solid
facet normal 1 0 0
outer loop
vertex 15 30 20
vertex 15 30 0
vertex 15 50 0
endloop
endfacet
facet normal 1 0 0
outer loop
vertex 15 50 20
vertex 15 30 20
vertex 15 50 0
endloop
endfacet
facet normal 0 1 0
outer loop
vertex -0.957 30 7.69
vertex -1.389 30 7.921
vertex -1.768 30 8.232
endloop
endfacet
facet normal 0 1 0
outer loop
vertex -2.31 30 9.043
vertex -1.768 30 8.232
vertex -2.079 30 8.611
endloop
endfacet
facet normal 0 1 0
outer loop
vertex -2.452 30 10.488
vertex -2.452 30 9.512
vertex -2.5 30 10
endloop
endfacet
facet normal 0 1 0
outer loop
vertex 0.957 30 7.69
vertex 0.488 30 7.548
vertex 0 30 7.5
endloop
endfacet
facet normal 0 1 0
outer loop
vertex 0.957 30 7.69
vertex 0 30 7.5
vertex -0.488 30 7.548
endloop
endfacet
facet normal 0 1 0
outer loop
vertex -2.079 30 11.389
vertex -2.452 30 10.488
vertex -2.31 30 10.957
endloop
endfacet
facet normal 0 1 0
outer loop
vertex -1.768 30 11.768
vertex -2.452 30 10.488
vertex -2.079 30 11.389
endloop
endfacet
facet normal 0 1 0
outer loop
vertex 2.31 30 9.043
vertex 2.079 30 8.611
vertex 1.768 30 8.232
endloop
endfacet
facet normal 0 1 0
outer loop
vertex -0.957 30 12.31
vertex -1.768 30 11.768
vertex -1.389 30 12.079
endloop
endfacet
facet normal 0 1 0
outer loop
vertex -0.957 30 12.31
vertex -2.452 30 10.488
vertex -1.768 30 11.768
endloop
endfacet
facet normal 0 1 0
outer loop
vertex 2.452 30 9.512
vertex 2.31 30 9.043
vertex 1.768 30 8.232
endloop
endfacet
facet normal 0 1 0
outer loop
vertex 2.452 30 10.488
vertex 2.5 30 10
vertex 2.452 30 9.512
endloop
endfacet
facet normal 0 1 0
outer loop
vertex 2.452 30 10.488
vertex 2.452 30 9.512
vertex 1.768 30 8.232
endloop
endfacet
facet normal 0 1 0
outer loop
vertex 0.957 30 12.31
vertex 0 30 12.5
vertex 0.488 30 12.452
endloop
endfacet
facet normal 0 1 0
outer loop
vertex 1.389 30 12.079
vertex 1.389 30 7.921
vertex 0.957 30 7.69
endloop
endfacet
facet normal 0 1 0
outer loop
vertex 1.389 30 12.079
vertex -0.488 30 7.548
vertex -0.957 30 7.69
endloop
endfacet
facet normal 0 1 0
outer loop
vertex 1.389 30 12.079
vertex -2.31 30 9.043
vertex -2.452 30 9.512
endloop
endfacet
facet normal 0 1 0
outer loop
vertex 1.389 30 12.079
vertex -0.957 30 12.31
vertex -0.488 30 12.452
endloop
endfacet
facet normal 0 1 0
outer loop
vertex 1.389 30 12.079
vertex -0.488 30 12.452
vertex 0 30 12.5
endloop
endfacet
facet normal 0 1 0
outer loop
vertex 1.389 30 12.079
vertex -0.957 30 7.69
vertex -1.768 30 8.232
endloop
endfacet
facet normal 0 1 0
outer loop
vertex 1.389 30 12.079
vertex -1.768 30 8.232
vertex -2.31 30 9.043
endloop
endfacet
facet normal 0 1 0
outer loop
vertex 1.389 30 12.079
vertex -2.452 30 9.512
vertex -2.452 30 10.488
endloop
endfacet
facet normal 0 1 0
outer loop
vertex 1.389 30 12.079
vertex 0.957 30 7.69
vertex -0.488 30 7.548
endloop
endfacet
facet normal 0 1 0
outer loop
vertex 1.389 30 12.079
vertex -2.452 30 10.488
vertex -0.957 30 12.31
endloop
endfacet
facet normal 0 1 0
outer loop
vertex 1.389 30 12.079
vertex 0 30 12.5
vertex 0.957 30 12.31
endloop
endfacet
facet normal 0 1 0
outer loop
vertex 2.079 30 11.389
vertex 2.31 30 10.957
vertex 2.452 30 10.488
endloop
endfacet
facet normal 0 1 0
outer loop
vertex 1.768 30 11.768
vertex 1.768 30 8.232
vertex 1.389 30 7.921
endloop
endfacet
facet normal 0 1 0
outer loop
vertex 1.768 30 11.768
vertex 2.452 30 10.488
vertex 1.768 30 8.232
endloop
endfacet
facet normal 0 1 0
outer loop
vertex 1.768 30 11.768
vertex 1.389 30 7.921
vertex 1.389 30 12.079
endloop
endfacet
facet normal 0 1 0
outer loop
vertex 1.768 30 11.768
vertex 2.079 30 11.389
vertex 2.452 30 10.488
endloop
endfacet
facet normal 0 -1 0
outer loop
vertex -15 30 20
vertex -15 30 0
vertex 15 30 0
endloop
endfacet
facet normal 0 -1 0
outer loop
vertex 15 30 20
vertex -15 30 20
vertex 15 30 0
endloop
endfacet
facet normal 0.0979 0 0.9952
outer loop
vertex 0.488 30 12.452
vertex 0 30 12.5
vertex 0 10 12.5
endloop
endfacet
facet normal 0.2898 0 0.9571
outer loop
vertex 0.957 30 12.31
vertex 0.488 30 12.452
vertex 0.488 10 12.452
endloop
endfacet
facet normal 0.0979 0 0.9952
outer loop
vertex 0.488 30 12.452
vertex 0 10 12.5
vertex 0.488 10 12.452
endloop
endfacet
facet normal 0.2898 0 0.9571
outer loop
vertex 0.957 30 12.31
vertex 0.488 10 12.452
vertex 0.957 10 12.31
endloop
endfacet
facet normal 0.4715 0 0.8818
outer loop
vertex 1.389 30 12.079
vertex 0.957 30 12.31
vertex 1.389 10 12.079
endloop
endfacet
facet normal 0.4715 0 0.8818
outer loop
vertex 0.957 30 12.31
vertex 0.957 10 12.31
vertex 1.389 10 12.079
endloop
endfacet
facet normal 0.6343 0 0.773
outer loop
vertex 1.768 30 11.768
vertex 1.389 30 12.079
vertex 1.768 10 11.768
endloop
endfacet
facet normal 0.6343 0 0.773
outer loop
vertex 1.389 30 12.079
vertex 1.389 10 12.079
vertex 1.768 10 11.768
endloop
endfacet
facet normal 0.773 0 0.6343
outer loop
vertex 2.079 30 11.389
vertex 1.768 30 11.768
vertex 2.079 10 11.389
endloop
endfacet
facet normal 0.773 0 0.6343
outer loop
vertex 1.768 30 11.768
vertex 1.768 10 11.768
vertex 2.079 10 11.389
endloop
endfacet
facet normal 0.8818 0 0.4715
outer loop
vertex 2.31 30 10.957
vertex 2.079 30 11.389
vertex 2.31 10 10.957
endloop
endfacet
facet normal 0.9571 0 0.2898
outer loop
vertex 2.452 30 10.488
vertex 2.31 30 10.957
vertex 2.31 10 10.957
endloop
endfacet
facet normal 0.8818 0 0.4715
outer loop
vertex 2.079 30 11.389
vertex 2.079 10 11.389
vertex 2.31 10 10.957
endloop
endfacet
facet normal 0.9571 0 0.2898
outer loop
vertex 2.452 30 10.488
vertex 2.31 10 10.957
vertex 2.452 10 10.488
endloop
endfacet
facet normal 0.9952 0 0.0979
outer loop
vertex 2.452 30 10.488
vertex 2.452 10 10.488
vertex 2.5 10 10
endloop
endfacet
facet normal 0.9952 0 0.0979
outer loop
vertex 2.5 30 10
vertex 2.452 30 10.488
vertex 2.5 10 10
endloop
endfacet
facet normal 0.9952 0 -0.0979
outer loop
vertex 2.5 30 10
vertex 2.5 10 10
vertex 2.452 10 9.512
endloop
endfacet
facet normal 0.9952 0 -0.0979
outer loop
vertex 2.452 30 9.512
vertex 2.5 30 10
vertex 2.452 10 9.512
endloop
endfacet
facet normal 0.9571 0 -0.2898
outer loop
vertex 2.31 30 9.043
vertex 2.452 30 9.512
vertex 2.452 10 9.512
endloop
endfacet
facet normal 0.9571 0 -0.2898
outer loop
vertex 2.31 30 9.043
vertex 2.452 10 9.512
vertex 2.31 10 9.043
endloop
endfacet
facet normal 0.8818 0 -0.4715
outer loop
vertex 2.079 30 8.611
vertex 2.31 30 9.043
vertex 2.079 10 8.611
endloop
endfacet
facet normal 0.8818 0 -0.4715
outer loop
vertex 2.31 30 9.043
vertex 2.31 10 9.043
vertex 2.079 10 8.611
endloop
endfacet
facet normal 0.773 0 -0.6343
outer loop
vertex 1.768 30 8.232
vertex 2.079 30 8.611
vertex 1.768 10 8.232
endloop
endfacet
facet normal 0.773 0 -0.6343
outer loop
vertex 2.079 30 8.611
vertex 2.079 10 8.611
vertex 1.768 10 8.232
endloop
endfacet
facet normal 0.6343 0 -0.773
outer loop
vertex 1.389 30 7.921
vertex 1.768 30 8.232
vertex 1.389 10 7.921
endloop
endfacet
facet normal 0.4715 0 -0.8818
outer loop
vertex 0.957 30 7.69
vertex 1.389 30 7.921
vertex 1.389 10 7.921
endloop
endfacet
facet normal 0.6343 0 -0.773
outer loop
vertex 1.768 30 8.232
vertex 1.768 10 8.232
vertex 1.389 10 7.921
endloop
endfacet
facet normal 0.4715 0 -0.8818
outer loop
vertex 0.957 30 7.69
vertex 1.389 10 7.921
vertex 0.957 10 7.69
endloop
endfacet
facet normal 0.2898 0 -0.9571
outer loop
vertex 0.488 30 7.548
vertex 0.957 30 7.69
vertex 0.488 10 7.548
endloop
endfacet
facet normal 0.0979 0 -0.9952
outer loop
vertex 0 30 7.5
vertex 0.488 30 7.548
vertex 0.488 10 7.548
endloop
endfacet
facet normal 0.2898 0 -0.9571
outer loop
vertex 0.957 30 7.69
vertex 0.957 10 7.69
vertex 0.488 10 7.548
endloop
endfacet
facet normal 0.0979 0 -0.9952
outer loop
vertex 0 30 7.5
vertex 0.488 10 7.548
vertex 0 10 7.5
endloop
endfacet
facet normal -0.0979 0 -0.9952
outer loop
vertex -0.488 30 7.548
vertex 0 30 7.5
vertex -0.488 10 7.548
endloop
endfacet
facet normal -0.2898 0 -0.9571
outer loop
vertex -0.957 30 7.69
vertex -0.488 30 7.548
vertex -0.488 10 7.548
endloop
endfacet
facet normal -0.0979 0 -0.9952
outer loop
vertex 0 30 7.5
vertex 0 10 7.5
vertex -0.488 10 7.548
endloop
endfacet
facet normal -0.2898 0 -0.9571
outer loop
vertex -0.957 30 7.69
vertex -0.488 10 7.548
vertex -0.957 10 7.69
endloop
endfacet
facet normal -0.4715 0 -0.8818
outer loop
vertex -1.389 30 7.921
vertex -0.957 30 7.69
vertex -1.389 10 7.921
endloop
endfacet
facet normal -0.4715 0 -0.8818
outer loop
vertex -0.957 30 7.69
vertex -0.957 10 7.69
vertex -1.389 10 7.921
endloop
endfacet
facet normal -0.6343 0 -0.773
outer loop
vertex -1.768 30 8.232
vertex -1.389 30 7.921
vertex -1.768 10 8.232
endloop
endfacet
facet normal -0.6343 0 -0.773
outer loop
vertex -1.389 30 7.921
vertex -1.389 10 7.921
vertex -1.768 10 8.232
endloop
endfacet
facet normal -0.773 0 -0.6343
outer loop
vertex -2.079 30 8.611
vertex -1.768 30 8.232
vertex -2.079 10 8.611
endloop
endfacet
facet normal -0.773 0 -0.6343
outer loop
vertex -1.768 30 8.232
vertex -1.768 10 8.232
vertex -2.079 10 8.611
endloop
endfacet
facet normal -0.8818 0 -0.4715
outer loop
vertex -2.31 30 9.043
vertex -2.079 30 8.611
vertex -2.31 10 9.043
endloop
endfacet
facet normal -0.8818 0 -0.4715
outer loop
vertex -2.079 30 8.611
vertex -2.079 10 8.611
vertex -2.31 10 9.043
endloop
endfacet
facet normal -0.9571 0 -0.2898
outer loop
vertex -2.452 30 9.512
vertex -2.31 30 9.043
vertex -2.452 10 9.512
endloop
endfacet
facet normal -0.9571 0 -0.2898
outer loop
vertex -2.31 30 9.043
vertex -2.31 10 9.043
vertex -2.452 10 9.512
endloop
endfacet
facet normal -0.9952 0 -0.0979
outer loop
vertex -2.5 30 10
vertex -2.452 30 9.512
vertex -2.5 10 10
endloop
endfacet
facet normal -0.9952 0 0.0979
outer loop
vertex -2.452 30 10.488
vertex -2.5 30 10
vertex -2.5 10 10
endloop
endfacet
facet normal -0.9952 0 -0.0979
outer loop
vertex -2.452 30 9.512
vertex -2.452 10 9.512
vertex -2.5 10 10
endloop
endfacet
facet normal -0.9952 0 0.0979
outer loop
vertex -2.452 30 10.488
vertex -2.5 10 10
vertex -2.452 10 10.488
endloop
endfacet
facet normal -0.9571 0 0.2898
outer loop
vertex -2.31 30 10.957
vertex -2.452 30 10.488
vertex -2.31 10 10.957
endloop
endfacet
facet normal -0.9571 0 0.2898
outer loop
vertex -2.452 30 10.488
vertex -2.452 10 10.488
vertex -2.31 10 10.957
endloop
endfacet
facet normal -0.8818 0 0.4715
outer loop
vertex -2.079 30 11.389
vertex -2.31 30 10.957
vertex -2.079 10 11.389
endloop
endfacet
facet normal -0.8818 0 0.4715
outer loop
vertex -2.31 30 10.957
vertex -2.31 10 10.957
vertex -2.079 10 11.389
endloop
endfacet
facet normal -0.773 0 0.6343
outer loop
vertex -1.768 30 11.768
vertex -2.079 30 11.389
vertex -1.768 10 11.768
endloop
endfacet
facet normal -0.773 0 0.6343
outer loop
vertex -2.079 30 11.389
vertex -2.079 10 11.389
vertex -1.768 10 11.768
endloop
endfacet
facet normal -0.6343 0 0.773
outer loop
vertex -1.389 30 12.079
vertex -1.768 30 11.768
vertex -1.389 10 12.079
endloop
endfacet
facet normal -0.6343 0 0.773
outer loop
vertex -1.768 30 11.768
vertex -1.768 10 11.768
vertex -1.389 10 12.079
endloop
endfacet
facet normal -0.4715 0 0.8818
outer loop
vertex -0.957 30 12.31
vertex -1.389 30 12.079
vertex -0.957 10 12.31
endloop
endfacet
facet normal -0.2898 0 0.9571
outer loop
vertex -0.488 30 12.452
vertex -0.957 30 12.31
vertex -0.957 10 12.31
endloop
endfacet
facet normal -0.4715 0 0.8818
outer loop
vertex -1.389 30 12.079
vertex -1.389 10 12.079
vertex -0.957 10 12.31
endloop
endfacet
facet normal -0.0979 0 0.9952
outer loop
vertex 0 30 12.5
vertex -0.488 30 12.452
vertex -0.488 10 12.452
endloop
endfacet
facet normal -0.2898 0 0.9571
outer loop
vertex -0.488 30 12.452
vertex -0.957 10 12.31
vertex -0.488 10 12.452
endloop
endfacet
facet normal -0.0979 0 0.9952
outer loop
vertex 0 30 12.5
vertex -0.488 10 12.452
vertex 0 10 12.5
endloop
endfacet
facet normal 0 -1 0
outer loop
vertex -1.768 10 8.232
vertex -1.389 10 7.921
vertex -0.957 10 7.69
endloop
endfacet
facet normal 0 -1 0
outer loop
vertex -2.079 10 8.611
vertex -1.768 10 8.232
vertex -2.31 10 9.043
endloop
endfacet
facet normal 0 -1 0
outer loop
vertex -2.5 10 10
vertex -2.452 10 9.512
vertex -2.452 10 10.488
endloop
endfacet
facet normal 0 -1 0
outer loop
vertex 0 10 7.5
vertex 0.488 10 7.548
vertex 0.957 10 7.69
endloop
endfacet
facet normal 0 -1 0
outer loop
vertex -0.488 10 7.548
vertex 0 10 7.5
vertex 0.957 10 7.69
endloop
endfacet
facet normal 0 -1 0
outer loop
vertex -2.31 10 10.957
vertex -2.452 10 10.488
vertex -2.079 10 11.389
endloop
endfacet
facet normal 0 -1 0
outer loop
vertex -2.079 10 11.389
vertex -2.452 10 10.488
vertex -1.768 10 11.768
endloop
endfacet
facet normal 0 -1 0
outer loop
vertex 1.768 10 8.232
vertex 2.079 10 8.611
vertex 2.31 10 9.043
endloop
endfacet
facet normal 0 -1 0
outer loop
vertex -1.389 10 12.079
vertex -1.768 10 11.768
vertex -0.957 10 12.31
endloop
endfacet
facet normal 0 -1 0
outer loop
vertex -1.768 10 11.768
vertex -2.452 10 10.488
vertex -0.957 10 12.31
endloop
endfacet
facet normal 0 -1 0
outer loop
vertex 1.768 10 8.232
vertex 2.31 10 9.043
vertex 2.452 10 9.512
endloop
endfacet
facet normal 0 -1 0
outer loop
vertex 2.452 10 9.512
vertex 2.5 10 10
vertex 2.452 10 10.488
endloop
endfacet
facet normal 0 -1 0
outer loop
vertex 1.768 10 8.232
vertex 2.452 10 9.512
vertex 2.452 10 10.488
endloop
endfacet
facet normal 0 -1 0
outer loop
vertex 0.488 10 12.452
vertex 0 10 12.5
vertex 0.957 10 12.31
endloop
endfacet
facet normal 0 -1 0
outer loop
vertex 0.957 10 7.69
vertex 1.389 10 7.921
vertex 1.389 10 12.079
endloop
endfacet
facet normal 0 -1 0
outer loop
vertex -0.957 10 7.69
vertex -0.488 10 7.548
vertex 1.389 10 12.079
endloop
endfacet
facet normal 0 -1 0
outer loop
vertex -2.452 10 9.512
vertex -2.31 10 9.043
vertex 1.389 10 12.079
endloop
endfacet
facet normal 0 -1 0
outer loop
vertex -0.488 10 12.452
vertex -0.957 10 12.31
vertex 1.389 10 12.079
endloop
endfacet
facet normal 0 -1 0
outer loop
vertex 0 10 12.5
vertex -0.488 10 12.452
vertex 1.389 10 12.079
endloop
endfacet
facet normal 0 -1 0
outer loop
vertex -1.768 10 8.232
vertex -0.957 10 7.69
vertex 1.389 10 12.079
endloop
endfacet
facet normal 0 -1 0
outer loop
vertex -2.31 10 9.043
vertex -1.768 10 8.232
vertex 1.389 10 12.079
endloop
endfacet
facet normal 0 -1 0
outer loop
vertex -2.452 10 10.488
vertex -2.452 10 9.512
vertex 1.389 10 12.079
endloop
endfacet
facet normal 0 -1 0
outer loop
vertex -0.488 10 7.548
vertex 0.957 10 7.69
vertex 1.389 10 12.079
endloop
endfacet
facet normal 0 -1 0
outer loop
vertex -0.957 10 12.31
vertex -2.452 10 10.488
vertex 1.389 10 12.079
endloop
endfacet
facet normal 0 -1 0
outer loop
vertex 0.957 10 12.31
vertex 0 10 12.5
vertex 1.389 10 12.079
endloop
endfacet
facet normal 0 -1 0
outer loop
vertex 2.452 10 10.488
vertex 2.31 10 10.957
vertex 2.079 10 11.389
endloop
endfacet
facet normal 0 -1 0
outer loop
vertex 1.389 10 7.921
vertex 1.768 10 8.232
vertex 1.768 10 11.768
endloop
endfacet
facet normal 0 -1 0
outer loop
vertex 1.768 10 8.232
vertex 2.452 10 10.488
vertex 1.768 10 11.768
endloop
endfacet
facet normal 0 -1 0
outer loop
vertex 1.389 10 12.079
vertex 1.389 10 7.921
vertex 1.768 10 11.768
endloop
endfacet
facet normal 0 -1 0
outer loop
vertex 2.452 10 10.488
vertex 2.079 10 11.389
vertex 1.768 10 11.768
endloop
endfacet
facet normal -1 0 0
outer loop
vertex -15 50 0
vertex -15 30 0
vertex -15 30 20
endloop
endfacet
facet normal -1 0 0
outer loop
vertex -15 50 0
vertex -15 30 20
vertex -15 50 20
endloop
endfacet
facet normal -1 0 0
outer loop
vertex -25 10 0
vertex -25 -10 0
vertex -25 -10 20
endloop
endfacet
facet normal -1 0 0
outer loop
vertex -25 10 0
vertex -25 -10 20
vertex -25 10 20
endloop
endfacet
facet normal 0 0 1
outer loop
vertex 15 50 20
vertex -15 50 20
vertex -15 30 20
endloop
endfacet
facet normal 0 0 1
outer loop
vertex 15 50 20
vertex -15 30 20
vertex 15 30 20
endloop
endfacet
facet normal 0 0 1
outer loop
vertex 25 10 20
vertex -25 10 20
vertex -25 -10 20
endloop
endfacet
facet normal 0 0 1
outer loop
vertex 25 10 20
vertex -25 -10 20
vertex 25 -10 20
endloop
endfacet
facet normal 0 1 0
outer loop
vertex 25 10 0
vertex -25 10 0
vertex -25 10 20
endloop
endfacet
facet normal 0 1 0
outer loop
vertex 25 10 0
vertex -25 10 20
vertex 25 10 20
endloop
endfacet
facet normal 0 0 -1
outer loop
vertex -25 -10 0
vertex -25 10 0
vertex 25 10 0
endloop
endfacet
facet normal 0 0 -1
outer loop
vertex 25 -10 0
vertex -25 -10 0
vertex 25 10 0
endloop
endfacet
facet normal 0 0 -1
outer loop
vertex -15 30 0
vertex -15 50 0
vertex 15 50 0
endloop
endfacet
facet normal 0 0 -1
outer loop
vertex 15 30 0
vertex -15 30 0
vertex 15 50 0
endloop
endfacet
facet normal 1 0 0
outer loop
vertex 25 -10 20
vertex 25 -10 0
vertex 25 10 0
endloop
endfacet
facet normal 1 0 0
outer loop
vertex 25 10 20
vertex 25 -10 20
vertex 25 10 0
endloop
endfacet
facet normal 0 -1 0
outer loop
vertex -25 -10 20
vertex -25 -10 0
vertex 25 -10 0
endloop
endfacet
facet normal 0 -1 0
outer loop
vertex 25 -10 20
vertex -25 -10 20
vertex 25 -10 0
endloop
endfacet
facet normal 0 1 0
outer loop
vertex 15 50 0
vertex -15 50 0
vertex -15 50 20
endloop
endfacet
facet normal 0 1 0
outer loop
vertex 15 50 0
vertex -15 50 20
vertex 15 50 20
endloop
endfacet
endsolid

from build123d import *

# Parameters (mm, degrees)
SKETCH1_W           = 50
SKETCH1_H           = 20
BOSS_EXTRUDE1_DEPTH = 20
SKETCH2_R           = 2.5
BOSS_EXTRUDE2_DEPTH = 20
SKETCH3_W           = 30
SKETCH3_H           = 20
BOSS_EXTRUDE3_DEPTH = 20


with BuildPart() as part:
    # Sketch1 → Boss-Extrude1 (new body)
    with BuildSketch(Plane.XY):
        Rectangle(SKETCH1_W, SKETCH1_H)
    extrude(amount=BOSS_EXTRUDE1_DEPTH)


with BuildPart() as body_2:
    # Sketch2 → Boss-Extrude2 (new body)
    with BuildSketch(Plane(origin=(0, 10, 0), x_dir=(1, 0, 0), z_dir=(0, 1, 0))):
        with Locations(Location((0, -10, 0), (0, 0, 270))):
            Circle(SKETCH2_R)
    extrude(amount=BOSS_EXTRUDE2_DEPTH)


with BuildPart() as body_3:
    # Sketch3 → Boss-Extrude3 (new body)
    with BuildSketch(Plane.XY):
        with Locations((0, 40)):
            Rectangle(SKETCH3_W, SKETCH3_H)
    extrude(amount=BOSS_EXTRUDE3_DEPTH)


solid = Compound([part.part, body_2.part, body_3.part])
